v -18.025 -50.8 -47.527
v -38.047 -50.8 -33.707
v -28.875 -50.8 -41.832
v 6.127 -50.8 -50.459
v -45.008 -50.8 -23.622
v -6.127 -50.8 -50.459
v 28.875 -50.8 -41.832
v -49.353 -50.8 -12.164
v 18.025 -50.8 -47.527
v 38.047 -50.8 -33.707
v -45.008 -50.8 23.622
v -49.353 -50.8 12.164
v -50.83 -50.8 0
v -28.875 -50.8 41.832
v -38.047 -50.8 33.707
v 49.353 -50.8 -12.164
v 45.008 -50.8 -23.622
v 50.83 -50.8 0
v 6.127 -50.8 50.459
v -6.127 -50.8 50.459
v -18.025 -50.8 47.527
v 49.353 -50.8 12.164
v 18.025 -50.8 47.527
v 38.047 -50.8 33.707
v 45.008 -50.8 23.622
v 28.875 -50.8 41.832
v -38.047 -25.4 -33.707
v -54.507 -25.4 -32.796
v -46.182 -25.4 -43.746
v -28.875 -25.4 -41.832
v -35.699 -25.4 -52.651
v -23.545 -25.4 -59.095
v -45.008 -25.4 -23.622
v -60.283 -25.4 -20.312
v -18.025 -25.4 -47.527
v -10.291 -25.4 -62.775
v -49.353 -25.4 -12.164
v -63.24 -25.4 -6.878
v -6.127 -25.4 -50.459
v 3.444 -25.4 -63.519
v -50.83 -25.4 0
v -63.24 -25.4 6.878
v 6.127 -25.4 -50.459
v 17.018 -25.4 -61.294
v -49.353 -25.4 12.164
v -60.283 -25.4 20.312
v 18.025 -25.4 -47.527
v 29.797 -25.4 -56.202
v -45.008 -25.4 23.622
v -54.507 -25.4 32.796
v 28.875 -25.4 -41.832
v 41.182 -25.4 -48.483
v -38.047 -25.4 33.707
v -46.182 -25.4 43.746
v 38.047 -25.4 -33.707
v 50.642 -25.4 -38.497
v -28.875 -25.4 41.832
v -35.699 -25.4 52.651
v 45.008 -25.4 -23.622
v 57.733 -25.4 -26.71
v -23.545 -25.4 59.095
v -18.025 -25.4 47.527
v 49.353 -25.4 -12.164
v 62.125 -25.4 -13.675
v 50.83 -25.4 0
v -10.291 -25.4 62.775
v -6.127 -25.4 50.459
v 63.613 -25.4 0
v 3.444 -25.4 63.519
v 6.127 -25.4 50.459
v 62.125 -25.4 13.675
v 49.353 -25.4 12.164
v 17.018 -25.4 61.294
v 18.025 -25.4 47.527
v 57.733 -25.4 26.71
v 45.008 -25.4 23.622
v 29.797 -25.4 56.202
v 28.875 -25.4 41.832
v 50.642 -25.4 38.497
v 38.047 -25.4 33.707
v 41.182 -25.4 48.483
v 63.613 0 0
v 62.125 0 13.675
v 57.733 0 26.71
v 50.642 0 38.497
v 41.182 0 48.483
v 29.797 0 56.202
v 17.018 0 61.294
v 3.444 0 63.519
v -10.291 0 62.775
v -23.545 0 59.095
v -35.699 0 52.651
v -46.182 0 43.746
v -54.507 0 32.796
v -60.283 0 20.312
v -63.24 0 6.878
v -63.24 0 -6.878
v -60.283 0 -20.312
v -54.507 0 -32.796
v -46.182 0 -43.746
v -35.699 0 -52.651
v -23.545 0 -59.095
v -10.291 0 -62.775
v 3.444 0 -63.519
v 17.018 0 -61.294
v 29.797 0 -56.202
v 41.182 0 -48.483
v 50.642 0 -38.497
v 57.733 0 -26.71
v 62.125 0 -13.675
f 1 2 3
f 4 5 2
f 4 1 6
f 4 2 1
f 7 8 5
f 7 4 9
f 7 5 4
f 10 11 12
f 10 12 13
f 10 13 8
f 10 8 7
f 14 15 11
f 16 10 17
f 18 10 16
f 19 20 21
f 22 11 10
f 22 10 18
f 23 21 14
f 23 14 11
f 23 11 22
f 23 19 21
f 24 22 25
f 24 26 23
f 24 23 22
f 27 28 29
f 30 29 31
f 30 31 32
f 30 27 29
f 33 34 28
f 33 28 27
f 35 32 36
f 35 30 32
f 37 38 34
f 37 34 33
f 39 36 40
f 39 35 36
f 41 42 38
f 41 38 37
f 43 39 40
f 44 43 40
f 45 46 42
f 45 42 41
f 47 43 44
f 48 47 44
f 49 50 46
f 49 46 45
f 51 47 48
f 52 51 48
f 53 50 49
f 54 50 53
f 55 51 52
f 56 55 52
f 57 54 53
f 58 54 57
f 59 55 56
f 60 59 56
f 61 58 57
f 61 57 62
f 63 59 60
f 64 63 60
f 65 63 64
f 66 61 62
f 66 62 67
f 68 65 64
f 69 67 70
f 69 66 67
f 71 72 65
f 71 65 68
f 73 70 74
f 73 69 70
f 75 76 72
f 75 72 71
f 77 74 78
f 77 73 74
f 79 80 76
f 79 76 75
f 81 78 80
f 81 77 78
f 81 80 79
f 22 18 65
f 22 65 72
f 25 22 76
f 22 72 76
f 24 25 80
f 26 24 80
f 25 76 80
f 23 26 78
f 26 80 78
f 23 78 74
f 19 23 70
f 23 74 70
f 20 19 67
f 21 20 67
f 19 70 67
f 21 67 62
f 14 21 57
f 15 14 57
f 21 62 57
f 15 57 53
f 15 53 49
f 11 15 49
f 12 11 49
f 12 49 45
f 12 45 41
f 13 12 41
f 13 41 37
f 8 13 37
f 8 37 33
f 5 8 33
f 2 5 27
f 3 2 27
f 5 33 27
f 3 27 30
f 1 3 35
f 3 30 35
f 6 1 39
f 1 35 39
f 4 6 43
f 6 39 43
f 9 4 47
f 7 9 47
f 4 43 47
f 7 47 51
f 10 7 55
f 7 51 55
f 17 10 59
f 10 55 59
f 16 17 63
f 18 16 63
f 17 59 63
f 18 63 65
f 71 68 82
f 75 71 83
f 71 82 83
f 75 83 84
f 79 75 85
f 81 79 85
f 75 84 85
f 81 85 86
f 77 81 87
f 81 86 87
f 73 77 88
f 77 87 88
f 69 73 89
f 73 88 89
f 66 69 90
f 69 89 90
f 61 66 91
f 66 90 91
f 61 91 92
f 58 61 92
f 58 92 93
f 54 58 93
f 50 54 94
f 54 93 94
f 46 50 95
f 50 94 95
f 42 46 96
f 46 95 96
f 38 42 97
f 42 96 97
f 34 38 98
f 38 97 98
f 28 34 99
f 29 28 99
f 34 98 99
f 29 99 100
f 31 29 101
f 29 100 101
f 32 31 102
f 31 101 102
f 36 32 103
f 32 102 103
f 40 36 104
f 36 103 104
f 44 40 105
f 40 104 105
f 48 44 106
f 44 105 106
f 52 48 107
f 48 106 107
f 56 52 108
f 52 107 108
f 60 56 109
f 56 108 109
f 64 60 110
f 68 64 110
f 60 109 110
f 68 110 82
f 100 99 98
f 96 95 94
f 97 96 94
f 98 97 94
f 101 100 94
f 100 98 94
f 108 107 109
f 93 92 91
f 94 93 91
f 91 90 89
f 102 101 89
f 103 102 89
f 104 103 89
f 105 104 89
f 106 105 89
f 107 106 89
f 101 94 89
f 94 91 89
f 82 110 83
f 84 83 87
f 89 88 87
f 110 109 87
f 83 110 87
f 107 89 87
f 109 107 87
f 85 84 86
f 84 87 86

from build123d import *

# Parameters (mm, degrees)
F2_W     = 25.016323
F2_H     = 27.49747
F3_DEPTH = 25.4
F0_R     = 63.612596
F1_R     = 32.019182
F4_DEPTH = 25.4
F5_R     = 50.830077
F6_DEPTH = 25.4


with BuildPart() as f3:
    # F2 (on face) → F3 (new body)
    with BuildSketch(Plane.XZ):
        with Locations((0.191535, -0.859296)):
            Rectangle(F2_W, F2_H)
    extrude(amount=F3_DEPTH)

    # F0 (on Front) + F1 (on face) → F4 (join)
    with BuildSketch(Plane.XZ):
        Circle(F0_R)
    with BuildSketch(Plane.XZ):
        Circle(F1_R)
    extrude(amount=F4_DEPTH)

    # F5 (on face) → F6 (join)
    with BuildSketch(Plane.XZ.offset(25.4)):
        Circle(F5_R)
    extrude(amount=F6_DEPTH)


solid = f3.part
